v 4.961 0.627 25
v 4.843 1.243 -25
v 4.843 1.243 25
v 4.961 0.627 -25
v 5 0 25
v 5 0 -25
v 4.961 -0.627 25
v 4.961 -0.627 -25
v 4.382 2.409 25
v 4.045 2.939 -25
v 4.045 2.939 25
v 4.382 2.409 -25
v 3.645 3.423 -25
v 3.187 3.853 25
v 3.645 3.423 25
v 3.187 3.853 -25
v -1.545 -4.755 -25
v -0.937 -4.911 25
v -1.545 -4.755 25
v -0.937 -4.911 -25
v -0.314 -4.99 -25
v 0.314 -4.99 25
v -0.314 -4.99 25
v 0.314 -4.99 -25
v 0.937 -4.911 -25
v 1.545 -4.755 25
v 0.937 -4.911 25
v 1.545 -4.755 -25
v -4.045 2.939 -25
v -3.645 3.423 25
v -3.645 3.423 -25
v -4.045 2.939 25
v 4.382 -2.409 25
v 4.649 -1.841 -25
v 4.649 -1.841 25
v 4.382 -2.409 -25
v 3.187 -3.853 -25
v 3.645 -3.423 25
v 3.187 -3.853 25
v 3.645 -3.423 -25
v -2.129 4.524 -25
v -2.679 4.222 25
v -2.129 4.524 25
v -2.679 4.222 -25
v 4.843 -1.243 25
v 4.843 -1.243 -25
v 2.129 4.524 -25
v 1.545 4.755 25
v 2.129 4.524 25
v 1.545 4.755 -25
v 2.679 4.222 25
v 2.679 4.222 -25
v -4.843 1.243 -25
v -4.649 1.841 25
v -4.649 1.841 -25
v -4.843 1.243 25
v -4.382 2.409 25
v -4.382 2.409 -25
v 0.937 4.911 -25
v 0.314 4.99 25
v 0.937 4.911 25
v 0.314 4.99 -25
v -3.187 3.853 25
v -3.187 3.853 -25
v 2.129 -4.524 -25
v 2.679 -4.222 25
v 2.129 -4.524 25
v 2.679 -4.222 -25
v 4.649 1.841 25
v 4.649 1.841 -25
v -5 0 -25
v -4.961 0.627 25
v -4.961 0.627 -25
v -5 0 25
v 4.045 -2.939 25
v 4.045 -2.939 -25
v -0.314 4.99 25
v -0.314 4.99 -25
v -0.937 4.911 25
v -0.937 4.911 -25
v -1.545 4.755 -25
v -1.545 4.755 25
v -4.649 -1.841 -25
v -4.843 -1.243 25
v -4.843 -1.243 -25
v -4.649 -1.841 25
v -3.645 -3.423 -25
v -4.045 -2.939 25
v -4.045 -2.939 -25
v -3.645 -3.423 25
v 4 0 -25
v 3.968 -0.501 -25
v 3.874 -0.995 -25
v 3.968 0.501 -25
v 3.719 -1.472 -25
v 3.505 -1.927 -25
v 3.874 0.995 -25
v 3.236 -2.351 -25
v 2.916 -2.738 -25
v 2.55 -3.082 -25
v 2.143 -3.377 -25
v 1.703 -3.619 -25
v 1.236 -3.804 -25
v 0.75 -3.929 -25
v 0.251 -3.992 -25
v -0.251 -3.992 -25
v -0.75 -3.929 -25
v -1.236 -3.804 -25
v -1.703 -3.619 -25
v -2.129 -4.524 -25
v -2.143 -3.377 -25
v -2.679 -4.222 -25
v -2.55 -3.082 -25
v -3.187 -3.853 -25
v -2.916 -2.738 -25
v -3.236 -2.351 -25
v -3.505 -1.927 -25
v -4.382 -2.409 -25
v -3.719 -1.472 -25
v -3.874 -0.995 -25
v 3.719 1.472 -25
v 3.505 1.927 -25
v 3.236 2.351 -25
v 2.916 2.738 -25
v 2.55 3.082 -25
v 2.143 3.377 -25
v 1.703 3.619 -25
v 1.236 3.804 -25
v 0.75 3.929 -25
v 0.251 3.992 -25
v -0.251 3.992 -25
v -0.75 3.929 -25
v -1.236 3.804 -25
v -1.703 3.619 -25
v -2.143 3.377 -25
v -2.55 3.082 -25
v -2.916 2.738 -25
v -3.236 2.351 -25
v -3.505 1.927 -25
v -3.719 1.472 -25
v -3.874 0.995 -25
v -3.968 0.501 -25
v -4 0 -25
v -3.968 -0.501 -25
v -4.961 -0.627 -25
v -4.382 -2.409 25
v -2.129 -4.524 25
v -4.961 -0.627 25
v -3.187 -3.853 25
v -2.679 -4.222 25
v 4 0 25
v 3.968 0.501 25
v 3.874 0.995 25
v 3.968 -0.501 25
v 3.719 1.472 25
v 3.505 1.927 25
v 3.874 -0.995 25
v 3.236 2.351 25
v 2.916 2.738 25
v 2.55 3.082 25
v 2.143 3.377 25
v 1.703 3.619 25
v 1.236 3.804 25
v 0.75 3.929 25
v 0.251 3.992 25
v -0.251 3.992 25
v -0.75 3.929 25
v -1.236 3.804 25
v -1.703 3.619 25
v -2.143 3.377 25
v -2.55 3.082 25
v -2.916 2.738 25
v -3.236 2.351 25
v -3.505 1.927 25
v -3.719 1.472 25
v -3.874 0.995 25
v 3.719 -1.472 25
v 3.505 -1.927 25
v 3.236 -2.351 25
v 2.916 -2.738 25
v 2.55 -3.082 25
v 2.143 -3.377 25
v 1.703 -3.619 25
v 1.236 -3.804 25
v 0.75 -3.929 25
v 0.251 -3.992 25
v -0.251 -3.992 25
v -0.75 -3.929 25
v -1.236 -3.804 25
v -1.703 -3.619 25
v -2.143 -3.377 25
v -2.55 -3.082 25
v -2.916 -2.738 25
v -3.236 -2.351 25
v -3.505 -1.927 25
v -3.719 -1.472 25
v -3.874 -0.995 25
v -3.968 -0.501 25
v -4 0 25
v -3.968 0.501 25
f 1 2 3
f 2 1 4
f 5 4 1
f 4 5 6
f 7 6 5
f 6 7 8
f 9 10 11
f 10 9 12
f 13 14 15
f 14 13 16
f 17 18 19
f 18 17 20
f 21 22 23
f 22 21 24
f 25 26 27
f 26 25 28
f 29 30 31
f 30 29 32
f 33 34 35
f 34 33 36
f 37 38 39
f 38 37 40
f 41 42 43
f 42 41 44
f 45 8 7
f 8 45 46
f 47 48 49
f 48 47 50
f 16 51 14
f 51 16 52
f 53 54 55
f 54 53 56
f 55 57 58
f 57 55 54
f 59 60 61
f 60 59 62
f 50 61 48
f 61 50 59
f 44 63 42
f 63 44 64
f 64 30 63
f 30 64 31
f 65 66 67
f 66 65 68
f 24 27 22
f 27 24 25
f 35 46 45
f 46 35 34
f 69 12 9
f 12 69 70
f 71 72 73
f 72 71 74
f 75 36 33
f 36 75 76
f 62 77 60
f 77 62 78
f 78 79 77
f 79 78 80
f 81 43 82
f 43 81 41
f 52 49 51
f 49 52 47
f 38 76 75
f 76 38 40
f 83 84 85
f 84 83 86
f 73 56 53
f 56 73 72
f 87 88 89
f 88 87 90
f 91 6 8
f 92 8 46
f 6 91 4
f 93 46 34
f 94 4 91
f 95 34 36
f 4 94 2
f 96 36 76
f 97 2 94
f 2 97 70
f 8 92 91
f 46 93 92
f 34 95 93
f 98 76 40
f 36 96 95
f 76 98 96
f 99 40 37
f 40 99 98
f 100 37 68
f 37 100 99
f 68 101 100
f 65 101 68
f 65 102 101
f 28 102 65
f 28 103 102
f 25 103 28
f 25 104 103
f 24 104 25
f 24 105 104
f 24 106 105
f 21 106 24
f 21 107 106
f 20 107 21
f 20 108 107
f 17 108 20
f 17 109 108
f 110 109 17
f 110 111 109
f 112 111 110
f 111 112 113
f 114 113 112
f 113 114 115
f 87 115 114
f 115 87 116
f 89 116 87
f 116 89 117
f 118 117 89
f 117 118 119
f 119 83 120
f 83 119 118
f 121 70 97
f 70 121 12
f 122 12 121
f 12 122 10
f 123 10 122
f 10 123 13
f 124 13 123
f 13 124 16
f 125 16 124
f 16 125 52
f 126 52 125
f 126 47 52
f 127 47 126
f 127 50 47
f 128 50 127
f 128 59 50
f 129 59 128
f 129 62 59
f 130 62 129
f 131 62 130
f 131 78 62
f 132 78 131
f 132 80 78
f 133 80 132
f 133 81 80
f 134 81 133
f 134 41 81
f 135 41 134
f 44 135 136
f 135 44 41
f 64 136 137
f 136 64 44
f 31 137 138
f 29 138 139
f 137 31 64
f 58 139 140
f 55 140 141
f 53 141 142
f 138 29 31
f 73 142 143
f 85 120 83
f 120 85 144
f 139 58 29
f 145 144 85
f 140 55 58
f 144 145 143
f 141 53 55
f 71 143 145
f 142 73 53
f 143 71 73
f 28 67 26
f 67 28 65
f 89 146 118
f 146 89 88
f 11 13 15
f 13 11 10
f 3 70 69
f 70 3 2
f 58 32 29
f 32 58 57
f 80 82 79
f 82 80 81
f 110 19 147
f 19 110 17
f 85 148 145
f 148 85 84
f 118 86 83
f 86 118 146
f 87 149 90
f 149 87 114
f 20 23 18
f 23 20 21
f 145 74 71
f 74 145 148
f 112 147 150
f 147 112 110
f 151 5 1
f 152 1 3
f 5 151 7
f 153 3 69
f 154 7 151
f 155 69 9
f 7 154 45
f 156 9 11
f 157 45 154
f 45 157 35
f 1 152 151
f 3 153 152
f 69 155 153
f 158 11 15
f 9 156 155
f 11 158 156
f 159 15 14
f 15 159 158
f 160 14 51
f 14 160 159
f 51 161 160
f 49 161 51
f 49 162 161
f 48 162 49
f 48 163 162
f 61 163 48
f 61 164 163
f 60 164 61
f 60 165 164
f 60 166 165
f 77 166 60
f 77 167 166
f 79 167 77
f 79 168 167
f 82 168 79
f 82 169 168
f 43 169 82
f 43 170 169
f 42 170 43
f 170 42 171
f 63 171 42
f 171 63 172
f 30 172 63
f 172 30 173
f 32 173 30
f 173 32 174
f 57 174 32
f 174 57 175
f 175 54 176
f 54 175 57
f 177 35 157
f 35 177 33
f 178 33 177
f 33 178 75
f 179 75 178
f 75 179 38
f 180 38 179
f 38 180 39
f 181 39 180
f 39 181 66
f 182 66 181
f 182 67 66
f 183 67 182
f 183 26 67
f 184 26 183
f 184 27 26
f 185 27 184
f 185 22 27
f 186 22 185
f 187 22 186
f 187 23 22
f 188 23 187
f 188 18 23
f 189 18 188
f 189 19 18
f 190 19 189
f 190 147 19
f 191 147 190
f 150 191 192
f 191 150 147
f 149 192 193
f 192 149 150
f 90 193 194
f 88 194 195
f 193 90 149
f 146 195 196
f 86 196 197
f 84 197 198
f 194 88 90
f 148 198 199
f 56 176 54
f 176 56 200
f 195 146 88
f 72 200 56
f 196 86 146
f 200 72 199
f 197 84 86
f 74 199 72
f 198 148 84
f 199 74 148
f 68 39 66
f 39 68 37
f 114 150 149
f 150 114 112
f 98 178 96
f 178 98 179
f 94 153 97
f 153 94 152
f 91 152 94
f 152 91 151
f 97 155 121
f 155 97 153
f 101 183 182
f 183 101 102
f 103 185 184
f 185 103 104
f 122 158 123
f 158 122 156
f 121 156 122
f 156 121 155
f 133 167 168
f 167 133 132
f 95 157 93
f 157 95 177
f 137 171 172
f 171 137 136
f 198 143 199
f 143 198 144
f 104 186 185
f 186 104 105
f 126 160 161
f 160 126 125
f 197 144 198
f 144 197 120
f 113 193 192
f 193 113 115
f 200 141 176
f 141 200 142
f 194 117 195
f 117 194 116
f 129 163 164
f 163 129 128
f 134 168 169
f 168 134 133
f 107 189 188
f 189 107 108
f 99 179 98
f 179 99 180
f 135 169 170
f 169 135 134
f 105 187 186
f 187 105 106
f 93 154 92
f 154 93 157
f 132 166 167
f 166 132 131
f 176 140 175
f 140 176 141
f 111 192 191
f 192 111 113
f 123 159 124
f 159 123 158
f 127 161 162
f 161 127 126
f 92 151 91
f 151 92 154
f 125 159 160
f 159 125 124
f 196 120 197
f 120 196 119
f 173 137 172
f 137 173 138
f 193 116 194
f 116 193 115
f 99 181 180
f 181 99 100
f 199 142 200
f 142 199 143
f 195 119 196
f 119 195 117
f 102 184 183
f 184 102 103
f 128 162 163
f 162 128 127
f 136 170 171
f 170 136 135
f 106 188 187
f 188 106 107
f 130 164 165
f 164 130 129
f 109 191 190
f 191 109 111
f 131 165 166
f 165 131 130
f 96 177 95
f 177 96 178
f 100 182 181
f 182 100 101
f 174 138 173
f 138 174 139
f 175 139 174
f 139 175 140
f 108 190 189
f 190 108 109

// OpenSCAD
$fn = 50;


difference() {
	union() {
		translate(v = [0, 0, -25.0000000000]) {
			cylinder(h = 50, r = 5.0000000000);
		}
	}
	union() {
		translate(v = [0, 0, -100.0000000000]) {
			cylinder(h = 200, r = 4.0000000000);
		}
	}
}
